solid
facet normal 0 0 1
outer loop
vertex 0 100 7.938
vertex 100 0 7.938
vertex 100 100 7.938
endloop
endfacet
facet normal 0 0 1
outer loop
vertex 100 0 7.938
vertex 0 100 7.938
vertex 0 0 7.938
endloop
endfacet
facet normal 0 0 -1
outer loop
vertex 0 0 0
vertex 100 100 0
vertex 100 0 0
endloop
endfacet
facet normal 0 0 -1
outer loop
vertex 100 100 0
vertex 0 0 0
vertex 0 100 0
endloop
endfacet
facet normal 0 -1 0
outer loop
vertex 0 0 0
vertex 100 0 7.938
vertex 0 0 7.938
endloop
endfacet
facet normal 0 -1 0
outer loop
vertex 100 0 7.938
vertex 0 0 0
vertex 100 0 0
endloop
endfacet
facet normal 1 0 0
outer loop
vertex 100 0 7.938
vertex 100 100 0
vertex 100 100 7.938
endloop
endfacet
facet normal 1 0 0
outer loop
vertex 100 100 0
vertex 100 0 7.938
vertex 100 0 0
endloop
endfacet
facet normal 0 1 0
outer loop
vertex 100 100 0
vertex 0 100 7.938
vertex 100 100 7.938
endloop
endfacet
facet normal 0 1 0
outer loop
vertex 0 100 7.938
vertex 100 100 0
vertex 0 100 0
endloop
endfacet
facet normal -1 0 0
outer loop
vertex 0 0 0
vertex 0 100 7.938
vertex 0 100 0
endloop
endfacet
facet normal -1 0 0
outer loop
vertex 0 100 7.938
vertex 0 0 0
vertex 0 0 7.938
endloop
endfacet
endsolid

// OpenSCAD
sheet_thickness = 5/16 * 25.4; // mm
sheet_width = 100;  // mm
sheet_length = 100; // mm

cube([sheet_length, sheet_width, sheet_thickness], center=false);
